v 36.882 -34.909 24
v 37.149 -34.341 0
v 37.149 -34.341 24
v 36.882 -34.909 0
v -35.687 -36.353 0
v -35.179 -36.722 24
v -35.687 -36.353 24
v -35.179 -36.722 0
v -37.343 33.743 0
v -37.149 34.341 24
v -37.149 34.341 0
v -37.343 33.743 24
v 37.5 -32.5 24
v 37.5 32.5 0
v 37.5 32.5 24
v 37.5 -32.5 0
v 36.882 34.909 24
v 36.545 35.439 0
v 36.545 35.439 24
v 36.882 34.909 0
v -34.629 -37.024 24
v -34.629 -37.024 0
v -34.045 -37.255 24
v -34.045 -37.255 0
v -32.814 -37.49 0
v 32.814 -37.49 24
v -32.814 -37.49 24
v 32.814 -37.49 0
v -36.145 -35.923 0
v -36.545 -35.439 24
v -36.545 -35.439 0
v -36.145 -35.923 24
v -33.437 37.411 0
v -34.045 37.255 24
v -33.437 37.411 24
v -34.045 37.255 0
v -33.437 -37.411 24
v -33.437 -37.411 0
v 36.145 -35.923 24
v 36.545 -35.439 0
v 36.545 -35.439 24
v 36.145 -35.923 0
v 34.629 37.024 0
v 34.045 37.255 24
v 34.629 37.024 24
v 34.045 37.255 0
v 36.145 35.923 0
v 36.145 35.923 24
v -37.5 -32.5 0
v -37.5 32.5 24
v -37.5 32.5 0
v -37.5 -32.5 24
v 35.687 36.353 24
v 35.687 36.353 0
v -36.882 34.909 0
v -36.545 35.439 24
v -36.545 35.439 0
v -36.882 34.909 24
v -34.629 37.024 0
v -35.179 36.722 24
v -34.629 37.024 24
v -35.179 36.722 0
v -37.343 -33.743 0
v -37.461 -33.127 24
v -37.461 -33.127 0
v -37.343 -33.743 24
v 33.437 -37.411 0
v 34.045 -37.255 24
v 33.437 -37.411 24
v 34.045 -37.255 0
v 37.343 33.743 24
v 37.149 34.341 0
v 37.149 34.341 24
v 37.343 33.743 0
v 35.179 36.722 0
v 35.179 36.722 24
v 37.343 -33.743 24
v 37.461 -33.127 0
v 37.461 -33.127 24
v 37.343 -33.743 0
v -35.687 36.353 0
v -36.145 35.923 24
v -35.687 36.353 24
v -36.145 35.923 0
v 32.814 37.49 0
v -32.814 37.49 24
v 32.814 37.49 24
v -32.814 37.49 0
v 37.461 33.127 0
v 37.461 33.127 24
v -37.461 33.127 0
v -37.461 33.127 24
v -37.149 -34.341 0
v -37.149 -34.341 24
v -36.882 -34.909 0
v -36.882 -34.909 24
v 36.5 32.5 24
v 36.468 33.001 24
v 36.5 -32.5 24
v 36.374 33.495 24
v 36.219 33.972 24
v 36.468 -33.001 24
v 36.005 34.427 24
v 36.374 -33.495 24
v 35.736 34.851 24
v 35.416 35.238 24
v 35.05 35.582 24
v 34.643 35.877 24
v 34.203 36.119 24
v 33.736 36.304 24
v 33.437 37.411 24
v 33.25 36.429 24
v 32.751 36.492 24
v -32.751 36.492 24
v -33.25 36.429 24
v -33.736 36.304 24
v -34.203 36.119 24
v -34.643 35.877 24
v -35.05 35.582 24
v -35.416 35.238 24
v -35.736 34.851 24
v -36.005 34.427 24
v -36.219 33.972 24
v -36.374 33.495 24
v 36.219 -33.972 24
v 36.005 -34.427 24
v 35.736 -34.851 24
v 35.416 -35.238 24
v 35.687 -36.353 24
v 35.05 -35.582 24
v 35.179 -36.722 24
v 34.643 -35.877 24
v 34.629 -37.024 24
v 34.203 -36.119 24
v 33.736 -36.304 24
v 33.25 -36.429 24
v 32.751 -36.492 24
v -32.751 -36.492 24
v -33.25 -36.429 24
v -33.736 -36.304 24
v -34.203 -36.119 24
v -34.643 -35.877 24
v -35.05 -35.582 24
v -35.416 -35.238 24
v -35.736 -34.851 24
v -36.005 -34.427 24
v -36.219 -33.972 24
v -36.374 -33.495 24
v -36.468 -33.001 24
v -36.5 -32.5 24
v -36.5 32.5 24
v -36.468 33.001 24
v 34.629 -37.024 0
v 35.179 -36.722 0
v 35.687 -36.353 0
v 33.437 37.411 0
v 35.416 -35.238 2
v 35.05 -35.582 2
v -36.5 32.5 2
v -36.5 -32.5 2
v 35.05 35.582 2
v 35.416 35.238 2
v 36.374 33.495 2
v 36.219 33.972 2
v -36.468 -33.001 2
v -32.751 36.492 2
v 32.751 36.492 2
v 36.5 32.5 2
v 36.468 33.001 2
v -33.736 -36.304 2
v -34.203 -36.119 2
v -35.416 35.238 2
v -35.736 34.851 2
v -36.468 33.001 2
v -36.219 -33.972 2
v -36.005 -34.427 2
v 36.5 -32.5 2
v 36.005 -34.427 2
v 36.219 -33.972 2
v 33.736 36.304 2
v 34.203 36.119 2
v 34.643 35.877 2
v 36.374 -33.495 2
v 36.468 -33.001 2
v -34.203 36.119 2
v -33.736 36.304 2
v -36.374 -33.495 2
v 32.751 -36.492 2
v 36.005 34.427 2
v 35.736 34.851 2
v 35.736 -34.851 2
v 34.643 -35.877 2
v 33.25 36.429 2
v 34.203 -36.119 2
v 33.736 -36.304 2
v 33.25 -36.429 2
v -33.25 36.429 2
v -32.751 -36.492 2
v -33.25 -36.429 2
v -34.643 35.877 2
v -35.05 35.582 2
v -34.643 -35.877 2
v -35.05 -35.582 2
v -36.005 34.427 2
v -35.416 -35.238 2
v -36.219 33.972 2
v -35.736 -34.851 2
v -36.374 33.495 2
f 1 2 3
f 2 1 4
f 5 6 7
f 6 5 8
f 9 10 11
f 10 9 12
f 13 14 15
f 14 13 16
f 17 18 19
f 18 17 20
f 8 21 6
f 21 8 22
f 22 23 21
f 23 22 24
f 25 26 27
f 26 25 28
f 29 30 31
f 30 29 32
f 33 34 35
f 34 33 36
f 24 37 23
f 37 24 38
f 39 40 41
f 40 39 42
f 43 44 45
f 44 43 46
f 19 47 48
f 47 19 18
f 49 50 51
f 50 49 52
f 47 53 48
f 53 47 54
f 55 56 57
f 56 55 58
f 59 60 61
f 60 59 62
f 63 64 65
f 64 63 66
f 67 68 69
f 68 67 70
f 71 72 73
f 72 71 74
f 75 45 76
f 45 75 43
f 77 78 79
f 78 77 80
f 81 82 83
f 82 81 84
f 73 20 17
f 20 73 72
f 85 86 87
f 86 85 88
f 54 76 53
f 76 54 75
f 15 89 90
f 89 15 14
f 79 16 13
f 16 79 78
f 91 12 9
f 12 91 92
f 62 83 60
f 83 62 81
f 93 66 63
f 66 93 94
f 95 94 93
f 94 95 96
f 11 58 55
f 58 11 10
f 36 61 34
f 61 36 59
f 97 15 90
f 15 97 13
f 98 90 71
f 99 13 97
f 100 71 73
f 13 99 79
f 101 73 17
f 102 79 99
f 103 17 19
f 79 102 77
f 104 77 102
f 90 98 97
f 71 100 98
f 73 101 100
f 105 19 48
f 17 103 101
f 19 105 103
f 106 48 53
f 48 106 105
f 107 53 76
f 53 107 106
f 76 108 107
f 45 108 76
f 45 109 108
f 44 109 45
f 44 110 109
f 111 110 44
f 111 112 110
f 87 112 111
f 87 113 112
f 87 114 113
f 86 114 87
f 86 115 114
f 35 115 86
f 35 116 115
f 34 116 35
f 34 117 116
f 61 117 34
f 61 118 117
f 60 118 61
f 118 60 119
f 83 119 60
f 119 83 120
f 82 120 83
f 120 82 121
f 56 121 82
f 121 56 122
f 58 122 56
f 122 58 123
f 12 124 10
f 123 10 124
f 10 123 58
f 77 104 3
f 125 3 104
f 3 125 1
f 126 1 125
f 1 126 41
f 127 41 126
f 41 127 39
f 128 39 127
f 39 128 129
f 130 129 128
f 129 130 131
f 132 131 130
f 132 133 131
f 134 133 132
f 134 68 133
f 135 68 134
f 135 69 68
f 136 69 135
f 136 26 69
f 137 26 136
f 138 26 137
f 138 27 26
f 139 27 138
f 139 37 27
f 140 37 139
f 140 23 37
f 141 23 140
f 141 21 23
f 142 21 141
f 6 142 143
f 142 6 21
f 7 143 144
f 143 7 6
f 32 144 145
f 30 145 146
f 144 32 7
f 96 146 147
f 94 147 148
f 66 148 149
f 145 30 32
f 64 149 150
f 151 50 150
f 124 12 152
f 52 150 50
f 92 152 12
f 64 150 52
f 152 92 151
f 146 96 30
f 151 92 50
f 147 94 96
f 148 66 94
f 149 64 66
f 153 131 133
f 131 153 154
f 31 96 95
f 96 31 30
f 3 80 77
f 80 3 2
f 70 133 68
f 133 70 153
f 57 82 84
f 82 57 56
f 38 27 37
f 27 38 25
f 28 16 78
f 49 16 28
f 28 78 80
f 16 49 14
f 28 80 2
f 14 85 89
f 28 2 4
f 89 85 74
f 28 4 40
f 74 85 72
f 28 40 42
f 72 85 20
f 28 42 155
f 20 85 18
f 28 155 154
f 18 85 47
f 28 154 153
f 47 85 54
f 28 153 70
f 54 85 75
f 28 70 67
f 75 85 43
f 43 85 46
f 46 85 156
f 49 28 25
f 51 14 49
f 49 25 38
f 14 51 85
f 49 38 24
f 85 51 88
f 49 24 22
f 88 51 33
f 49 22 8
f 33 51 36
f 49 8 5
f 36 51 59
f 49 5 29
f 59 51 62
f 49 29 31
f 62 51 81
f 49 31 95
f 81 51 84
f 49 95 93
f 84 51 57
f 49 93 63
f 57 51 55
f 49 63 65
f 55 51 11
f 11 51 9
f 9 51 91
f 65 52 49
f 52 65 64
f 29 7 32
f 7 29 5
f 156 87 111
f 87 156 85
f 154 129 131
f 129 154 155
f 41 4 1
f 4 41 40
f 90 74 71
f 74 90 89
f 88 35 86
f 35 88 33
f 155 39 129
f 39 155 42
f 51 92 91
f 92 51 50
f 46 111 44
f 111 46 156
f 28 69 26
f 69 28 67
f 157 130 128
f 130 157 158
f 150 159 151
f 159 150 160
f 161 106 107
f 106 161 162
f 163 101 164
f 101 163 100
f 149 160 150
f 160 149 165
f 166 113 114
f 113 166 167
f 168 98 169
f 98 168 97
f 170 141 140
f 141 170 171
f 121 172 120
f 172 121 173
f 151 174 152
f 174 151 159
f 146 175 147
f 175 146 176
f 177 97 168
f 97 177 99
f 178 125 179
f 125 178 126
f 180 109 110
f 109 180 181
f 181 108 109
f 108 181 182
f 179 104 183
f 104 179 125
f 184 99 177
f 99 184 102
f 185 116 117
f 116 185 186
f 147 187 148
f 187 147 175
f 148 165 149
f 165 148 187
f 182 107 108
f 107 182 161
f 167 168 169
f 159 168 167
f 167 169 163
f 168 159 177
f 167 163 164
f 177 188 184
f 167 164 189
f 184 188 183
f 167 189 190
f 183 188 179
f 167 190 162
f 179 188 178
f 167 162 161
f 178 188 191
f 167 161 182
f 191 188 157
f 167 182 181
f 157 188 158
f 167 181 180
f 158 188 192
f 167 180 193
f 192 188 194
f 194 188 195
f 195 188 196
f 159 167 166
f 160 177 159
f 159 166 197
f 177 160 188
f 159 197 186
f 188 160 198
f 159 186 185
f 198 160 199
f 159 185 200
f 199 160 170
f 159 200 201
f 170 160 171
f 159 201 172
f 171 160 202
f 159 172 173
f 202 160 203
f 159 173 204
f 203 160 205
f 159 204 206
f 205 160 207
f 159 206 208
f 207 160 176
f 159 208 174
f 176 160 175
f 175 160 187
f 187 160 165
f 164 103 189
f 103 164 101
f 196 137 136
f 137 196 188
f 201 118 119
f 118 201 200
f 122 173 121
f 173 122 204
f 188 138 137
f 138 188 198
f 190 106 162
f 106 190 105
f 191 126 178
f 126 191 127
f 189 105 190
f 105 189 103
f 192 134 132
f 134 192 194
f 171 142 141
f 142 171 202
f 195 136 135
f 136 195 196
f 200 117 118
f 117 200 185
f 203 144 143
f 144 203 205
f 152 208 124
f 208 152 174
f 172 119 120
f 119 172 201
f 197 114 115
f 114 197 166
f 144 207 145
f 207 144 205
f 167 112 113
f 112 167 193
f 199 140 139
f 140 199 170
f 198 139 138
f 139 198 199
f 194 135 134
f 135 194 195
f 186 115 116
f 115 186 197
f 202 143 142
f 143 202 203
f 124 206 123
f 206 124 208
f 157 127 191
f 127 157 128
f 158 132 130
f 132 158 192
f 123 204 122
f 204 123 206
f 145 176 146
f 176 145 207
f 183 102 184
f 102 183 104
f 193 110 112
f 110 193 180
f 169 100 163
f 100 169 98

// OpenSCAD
$fn = 50;


difference() {
	union() {
		hull() {
			translate(v = [-32.5000000000, 32.5000000000, 0]) {
				cylinder(h = 24, r = 5);
			}
			translate(v = [32.5000000000, 32.5000000000, 0]) {
				cylinder(h = 24, r = 5);
			}
			translate(v = [-32.5000000000, -32.5000000000, 0]) {
				cylinder(h = 24, r = 5);
			}
			translate(v = [32.5000000000, -32.5000000000, 0]) {
				cylinder(h = 24, r = 5);
			}
		}
	}
	union() {
		translate(v = [0, 0, 2]) {
			hull() {
				translate(v = [-32.5000000000, 32.5000000000, 0]) {
					cylinder(h = 22, r = 4);
				}
				translate(v = [32.5000000000, 32.5000000000, 0]) {
					cylinder(h = 22, r = 4);
				}
				translate(v = [-32.5000000000, -32.5000000000, 0]) {
					cylinder(h = 22, r = 4);
				}
				translate(v = [32.5000000000, -32.5000000000, 0]) {
					cylinder(h = 22, r = 4);
				}
			}
		}
	}
}
